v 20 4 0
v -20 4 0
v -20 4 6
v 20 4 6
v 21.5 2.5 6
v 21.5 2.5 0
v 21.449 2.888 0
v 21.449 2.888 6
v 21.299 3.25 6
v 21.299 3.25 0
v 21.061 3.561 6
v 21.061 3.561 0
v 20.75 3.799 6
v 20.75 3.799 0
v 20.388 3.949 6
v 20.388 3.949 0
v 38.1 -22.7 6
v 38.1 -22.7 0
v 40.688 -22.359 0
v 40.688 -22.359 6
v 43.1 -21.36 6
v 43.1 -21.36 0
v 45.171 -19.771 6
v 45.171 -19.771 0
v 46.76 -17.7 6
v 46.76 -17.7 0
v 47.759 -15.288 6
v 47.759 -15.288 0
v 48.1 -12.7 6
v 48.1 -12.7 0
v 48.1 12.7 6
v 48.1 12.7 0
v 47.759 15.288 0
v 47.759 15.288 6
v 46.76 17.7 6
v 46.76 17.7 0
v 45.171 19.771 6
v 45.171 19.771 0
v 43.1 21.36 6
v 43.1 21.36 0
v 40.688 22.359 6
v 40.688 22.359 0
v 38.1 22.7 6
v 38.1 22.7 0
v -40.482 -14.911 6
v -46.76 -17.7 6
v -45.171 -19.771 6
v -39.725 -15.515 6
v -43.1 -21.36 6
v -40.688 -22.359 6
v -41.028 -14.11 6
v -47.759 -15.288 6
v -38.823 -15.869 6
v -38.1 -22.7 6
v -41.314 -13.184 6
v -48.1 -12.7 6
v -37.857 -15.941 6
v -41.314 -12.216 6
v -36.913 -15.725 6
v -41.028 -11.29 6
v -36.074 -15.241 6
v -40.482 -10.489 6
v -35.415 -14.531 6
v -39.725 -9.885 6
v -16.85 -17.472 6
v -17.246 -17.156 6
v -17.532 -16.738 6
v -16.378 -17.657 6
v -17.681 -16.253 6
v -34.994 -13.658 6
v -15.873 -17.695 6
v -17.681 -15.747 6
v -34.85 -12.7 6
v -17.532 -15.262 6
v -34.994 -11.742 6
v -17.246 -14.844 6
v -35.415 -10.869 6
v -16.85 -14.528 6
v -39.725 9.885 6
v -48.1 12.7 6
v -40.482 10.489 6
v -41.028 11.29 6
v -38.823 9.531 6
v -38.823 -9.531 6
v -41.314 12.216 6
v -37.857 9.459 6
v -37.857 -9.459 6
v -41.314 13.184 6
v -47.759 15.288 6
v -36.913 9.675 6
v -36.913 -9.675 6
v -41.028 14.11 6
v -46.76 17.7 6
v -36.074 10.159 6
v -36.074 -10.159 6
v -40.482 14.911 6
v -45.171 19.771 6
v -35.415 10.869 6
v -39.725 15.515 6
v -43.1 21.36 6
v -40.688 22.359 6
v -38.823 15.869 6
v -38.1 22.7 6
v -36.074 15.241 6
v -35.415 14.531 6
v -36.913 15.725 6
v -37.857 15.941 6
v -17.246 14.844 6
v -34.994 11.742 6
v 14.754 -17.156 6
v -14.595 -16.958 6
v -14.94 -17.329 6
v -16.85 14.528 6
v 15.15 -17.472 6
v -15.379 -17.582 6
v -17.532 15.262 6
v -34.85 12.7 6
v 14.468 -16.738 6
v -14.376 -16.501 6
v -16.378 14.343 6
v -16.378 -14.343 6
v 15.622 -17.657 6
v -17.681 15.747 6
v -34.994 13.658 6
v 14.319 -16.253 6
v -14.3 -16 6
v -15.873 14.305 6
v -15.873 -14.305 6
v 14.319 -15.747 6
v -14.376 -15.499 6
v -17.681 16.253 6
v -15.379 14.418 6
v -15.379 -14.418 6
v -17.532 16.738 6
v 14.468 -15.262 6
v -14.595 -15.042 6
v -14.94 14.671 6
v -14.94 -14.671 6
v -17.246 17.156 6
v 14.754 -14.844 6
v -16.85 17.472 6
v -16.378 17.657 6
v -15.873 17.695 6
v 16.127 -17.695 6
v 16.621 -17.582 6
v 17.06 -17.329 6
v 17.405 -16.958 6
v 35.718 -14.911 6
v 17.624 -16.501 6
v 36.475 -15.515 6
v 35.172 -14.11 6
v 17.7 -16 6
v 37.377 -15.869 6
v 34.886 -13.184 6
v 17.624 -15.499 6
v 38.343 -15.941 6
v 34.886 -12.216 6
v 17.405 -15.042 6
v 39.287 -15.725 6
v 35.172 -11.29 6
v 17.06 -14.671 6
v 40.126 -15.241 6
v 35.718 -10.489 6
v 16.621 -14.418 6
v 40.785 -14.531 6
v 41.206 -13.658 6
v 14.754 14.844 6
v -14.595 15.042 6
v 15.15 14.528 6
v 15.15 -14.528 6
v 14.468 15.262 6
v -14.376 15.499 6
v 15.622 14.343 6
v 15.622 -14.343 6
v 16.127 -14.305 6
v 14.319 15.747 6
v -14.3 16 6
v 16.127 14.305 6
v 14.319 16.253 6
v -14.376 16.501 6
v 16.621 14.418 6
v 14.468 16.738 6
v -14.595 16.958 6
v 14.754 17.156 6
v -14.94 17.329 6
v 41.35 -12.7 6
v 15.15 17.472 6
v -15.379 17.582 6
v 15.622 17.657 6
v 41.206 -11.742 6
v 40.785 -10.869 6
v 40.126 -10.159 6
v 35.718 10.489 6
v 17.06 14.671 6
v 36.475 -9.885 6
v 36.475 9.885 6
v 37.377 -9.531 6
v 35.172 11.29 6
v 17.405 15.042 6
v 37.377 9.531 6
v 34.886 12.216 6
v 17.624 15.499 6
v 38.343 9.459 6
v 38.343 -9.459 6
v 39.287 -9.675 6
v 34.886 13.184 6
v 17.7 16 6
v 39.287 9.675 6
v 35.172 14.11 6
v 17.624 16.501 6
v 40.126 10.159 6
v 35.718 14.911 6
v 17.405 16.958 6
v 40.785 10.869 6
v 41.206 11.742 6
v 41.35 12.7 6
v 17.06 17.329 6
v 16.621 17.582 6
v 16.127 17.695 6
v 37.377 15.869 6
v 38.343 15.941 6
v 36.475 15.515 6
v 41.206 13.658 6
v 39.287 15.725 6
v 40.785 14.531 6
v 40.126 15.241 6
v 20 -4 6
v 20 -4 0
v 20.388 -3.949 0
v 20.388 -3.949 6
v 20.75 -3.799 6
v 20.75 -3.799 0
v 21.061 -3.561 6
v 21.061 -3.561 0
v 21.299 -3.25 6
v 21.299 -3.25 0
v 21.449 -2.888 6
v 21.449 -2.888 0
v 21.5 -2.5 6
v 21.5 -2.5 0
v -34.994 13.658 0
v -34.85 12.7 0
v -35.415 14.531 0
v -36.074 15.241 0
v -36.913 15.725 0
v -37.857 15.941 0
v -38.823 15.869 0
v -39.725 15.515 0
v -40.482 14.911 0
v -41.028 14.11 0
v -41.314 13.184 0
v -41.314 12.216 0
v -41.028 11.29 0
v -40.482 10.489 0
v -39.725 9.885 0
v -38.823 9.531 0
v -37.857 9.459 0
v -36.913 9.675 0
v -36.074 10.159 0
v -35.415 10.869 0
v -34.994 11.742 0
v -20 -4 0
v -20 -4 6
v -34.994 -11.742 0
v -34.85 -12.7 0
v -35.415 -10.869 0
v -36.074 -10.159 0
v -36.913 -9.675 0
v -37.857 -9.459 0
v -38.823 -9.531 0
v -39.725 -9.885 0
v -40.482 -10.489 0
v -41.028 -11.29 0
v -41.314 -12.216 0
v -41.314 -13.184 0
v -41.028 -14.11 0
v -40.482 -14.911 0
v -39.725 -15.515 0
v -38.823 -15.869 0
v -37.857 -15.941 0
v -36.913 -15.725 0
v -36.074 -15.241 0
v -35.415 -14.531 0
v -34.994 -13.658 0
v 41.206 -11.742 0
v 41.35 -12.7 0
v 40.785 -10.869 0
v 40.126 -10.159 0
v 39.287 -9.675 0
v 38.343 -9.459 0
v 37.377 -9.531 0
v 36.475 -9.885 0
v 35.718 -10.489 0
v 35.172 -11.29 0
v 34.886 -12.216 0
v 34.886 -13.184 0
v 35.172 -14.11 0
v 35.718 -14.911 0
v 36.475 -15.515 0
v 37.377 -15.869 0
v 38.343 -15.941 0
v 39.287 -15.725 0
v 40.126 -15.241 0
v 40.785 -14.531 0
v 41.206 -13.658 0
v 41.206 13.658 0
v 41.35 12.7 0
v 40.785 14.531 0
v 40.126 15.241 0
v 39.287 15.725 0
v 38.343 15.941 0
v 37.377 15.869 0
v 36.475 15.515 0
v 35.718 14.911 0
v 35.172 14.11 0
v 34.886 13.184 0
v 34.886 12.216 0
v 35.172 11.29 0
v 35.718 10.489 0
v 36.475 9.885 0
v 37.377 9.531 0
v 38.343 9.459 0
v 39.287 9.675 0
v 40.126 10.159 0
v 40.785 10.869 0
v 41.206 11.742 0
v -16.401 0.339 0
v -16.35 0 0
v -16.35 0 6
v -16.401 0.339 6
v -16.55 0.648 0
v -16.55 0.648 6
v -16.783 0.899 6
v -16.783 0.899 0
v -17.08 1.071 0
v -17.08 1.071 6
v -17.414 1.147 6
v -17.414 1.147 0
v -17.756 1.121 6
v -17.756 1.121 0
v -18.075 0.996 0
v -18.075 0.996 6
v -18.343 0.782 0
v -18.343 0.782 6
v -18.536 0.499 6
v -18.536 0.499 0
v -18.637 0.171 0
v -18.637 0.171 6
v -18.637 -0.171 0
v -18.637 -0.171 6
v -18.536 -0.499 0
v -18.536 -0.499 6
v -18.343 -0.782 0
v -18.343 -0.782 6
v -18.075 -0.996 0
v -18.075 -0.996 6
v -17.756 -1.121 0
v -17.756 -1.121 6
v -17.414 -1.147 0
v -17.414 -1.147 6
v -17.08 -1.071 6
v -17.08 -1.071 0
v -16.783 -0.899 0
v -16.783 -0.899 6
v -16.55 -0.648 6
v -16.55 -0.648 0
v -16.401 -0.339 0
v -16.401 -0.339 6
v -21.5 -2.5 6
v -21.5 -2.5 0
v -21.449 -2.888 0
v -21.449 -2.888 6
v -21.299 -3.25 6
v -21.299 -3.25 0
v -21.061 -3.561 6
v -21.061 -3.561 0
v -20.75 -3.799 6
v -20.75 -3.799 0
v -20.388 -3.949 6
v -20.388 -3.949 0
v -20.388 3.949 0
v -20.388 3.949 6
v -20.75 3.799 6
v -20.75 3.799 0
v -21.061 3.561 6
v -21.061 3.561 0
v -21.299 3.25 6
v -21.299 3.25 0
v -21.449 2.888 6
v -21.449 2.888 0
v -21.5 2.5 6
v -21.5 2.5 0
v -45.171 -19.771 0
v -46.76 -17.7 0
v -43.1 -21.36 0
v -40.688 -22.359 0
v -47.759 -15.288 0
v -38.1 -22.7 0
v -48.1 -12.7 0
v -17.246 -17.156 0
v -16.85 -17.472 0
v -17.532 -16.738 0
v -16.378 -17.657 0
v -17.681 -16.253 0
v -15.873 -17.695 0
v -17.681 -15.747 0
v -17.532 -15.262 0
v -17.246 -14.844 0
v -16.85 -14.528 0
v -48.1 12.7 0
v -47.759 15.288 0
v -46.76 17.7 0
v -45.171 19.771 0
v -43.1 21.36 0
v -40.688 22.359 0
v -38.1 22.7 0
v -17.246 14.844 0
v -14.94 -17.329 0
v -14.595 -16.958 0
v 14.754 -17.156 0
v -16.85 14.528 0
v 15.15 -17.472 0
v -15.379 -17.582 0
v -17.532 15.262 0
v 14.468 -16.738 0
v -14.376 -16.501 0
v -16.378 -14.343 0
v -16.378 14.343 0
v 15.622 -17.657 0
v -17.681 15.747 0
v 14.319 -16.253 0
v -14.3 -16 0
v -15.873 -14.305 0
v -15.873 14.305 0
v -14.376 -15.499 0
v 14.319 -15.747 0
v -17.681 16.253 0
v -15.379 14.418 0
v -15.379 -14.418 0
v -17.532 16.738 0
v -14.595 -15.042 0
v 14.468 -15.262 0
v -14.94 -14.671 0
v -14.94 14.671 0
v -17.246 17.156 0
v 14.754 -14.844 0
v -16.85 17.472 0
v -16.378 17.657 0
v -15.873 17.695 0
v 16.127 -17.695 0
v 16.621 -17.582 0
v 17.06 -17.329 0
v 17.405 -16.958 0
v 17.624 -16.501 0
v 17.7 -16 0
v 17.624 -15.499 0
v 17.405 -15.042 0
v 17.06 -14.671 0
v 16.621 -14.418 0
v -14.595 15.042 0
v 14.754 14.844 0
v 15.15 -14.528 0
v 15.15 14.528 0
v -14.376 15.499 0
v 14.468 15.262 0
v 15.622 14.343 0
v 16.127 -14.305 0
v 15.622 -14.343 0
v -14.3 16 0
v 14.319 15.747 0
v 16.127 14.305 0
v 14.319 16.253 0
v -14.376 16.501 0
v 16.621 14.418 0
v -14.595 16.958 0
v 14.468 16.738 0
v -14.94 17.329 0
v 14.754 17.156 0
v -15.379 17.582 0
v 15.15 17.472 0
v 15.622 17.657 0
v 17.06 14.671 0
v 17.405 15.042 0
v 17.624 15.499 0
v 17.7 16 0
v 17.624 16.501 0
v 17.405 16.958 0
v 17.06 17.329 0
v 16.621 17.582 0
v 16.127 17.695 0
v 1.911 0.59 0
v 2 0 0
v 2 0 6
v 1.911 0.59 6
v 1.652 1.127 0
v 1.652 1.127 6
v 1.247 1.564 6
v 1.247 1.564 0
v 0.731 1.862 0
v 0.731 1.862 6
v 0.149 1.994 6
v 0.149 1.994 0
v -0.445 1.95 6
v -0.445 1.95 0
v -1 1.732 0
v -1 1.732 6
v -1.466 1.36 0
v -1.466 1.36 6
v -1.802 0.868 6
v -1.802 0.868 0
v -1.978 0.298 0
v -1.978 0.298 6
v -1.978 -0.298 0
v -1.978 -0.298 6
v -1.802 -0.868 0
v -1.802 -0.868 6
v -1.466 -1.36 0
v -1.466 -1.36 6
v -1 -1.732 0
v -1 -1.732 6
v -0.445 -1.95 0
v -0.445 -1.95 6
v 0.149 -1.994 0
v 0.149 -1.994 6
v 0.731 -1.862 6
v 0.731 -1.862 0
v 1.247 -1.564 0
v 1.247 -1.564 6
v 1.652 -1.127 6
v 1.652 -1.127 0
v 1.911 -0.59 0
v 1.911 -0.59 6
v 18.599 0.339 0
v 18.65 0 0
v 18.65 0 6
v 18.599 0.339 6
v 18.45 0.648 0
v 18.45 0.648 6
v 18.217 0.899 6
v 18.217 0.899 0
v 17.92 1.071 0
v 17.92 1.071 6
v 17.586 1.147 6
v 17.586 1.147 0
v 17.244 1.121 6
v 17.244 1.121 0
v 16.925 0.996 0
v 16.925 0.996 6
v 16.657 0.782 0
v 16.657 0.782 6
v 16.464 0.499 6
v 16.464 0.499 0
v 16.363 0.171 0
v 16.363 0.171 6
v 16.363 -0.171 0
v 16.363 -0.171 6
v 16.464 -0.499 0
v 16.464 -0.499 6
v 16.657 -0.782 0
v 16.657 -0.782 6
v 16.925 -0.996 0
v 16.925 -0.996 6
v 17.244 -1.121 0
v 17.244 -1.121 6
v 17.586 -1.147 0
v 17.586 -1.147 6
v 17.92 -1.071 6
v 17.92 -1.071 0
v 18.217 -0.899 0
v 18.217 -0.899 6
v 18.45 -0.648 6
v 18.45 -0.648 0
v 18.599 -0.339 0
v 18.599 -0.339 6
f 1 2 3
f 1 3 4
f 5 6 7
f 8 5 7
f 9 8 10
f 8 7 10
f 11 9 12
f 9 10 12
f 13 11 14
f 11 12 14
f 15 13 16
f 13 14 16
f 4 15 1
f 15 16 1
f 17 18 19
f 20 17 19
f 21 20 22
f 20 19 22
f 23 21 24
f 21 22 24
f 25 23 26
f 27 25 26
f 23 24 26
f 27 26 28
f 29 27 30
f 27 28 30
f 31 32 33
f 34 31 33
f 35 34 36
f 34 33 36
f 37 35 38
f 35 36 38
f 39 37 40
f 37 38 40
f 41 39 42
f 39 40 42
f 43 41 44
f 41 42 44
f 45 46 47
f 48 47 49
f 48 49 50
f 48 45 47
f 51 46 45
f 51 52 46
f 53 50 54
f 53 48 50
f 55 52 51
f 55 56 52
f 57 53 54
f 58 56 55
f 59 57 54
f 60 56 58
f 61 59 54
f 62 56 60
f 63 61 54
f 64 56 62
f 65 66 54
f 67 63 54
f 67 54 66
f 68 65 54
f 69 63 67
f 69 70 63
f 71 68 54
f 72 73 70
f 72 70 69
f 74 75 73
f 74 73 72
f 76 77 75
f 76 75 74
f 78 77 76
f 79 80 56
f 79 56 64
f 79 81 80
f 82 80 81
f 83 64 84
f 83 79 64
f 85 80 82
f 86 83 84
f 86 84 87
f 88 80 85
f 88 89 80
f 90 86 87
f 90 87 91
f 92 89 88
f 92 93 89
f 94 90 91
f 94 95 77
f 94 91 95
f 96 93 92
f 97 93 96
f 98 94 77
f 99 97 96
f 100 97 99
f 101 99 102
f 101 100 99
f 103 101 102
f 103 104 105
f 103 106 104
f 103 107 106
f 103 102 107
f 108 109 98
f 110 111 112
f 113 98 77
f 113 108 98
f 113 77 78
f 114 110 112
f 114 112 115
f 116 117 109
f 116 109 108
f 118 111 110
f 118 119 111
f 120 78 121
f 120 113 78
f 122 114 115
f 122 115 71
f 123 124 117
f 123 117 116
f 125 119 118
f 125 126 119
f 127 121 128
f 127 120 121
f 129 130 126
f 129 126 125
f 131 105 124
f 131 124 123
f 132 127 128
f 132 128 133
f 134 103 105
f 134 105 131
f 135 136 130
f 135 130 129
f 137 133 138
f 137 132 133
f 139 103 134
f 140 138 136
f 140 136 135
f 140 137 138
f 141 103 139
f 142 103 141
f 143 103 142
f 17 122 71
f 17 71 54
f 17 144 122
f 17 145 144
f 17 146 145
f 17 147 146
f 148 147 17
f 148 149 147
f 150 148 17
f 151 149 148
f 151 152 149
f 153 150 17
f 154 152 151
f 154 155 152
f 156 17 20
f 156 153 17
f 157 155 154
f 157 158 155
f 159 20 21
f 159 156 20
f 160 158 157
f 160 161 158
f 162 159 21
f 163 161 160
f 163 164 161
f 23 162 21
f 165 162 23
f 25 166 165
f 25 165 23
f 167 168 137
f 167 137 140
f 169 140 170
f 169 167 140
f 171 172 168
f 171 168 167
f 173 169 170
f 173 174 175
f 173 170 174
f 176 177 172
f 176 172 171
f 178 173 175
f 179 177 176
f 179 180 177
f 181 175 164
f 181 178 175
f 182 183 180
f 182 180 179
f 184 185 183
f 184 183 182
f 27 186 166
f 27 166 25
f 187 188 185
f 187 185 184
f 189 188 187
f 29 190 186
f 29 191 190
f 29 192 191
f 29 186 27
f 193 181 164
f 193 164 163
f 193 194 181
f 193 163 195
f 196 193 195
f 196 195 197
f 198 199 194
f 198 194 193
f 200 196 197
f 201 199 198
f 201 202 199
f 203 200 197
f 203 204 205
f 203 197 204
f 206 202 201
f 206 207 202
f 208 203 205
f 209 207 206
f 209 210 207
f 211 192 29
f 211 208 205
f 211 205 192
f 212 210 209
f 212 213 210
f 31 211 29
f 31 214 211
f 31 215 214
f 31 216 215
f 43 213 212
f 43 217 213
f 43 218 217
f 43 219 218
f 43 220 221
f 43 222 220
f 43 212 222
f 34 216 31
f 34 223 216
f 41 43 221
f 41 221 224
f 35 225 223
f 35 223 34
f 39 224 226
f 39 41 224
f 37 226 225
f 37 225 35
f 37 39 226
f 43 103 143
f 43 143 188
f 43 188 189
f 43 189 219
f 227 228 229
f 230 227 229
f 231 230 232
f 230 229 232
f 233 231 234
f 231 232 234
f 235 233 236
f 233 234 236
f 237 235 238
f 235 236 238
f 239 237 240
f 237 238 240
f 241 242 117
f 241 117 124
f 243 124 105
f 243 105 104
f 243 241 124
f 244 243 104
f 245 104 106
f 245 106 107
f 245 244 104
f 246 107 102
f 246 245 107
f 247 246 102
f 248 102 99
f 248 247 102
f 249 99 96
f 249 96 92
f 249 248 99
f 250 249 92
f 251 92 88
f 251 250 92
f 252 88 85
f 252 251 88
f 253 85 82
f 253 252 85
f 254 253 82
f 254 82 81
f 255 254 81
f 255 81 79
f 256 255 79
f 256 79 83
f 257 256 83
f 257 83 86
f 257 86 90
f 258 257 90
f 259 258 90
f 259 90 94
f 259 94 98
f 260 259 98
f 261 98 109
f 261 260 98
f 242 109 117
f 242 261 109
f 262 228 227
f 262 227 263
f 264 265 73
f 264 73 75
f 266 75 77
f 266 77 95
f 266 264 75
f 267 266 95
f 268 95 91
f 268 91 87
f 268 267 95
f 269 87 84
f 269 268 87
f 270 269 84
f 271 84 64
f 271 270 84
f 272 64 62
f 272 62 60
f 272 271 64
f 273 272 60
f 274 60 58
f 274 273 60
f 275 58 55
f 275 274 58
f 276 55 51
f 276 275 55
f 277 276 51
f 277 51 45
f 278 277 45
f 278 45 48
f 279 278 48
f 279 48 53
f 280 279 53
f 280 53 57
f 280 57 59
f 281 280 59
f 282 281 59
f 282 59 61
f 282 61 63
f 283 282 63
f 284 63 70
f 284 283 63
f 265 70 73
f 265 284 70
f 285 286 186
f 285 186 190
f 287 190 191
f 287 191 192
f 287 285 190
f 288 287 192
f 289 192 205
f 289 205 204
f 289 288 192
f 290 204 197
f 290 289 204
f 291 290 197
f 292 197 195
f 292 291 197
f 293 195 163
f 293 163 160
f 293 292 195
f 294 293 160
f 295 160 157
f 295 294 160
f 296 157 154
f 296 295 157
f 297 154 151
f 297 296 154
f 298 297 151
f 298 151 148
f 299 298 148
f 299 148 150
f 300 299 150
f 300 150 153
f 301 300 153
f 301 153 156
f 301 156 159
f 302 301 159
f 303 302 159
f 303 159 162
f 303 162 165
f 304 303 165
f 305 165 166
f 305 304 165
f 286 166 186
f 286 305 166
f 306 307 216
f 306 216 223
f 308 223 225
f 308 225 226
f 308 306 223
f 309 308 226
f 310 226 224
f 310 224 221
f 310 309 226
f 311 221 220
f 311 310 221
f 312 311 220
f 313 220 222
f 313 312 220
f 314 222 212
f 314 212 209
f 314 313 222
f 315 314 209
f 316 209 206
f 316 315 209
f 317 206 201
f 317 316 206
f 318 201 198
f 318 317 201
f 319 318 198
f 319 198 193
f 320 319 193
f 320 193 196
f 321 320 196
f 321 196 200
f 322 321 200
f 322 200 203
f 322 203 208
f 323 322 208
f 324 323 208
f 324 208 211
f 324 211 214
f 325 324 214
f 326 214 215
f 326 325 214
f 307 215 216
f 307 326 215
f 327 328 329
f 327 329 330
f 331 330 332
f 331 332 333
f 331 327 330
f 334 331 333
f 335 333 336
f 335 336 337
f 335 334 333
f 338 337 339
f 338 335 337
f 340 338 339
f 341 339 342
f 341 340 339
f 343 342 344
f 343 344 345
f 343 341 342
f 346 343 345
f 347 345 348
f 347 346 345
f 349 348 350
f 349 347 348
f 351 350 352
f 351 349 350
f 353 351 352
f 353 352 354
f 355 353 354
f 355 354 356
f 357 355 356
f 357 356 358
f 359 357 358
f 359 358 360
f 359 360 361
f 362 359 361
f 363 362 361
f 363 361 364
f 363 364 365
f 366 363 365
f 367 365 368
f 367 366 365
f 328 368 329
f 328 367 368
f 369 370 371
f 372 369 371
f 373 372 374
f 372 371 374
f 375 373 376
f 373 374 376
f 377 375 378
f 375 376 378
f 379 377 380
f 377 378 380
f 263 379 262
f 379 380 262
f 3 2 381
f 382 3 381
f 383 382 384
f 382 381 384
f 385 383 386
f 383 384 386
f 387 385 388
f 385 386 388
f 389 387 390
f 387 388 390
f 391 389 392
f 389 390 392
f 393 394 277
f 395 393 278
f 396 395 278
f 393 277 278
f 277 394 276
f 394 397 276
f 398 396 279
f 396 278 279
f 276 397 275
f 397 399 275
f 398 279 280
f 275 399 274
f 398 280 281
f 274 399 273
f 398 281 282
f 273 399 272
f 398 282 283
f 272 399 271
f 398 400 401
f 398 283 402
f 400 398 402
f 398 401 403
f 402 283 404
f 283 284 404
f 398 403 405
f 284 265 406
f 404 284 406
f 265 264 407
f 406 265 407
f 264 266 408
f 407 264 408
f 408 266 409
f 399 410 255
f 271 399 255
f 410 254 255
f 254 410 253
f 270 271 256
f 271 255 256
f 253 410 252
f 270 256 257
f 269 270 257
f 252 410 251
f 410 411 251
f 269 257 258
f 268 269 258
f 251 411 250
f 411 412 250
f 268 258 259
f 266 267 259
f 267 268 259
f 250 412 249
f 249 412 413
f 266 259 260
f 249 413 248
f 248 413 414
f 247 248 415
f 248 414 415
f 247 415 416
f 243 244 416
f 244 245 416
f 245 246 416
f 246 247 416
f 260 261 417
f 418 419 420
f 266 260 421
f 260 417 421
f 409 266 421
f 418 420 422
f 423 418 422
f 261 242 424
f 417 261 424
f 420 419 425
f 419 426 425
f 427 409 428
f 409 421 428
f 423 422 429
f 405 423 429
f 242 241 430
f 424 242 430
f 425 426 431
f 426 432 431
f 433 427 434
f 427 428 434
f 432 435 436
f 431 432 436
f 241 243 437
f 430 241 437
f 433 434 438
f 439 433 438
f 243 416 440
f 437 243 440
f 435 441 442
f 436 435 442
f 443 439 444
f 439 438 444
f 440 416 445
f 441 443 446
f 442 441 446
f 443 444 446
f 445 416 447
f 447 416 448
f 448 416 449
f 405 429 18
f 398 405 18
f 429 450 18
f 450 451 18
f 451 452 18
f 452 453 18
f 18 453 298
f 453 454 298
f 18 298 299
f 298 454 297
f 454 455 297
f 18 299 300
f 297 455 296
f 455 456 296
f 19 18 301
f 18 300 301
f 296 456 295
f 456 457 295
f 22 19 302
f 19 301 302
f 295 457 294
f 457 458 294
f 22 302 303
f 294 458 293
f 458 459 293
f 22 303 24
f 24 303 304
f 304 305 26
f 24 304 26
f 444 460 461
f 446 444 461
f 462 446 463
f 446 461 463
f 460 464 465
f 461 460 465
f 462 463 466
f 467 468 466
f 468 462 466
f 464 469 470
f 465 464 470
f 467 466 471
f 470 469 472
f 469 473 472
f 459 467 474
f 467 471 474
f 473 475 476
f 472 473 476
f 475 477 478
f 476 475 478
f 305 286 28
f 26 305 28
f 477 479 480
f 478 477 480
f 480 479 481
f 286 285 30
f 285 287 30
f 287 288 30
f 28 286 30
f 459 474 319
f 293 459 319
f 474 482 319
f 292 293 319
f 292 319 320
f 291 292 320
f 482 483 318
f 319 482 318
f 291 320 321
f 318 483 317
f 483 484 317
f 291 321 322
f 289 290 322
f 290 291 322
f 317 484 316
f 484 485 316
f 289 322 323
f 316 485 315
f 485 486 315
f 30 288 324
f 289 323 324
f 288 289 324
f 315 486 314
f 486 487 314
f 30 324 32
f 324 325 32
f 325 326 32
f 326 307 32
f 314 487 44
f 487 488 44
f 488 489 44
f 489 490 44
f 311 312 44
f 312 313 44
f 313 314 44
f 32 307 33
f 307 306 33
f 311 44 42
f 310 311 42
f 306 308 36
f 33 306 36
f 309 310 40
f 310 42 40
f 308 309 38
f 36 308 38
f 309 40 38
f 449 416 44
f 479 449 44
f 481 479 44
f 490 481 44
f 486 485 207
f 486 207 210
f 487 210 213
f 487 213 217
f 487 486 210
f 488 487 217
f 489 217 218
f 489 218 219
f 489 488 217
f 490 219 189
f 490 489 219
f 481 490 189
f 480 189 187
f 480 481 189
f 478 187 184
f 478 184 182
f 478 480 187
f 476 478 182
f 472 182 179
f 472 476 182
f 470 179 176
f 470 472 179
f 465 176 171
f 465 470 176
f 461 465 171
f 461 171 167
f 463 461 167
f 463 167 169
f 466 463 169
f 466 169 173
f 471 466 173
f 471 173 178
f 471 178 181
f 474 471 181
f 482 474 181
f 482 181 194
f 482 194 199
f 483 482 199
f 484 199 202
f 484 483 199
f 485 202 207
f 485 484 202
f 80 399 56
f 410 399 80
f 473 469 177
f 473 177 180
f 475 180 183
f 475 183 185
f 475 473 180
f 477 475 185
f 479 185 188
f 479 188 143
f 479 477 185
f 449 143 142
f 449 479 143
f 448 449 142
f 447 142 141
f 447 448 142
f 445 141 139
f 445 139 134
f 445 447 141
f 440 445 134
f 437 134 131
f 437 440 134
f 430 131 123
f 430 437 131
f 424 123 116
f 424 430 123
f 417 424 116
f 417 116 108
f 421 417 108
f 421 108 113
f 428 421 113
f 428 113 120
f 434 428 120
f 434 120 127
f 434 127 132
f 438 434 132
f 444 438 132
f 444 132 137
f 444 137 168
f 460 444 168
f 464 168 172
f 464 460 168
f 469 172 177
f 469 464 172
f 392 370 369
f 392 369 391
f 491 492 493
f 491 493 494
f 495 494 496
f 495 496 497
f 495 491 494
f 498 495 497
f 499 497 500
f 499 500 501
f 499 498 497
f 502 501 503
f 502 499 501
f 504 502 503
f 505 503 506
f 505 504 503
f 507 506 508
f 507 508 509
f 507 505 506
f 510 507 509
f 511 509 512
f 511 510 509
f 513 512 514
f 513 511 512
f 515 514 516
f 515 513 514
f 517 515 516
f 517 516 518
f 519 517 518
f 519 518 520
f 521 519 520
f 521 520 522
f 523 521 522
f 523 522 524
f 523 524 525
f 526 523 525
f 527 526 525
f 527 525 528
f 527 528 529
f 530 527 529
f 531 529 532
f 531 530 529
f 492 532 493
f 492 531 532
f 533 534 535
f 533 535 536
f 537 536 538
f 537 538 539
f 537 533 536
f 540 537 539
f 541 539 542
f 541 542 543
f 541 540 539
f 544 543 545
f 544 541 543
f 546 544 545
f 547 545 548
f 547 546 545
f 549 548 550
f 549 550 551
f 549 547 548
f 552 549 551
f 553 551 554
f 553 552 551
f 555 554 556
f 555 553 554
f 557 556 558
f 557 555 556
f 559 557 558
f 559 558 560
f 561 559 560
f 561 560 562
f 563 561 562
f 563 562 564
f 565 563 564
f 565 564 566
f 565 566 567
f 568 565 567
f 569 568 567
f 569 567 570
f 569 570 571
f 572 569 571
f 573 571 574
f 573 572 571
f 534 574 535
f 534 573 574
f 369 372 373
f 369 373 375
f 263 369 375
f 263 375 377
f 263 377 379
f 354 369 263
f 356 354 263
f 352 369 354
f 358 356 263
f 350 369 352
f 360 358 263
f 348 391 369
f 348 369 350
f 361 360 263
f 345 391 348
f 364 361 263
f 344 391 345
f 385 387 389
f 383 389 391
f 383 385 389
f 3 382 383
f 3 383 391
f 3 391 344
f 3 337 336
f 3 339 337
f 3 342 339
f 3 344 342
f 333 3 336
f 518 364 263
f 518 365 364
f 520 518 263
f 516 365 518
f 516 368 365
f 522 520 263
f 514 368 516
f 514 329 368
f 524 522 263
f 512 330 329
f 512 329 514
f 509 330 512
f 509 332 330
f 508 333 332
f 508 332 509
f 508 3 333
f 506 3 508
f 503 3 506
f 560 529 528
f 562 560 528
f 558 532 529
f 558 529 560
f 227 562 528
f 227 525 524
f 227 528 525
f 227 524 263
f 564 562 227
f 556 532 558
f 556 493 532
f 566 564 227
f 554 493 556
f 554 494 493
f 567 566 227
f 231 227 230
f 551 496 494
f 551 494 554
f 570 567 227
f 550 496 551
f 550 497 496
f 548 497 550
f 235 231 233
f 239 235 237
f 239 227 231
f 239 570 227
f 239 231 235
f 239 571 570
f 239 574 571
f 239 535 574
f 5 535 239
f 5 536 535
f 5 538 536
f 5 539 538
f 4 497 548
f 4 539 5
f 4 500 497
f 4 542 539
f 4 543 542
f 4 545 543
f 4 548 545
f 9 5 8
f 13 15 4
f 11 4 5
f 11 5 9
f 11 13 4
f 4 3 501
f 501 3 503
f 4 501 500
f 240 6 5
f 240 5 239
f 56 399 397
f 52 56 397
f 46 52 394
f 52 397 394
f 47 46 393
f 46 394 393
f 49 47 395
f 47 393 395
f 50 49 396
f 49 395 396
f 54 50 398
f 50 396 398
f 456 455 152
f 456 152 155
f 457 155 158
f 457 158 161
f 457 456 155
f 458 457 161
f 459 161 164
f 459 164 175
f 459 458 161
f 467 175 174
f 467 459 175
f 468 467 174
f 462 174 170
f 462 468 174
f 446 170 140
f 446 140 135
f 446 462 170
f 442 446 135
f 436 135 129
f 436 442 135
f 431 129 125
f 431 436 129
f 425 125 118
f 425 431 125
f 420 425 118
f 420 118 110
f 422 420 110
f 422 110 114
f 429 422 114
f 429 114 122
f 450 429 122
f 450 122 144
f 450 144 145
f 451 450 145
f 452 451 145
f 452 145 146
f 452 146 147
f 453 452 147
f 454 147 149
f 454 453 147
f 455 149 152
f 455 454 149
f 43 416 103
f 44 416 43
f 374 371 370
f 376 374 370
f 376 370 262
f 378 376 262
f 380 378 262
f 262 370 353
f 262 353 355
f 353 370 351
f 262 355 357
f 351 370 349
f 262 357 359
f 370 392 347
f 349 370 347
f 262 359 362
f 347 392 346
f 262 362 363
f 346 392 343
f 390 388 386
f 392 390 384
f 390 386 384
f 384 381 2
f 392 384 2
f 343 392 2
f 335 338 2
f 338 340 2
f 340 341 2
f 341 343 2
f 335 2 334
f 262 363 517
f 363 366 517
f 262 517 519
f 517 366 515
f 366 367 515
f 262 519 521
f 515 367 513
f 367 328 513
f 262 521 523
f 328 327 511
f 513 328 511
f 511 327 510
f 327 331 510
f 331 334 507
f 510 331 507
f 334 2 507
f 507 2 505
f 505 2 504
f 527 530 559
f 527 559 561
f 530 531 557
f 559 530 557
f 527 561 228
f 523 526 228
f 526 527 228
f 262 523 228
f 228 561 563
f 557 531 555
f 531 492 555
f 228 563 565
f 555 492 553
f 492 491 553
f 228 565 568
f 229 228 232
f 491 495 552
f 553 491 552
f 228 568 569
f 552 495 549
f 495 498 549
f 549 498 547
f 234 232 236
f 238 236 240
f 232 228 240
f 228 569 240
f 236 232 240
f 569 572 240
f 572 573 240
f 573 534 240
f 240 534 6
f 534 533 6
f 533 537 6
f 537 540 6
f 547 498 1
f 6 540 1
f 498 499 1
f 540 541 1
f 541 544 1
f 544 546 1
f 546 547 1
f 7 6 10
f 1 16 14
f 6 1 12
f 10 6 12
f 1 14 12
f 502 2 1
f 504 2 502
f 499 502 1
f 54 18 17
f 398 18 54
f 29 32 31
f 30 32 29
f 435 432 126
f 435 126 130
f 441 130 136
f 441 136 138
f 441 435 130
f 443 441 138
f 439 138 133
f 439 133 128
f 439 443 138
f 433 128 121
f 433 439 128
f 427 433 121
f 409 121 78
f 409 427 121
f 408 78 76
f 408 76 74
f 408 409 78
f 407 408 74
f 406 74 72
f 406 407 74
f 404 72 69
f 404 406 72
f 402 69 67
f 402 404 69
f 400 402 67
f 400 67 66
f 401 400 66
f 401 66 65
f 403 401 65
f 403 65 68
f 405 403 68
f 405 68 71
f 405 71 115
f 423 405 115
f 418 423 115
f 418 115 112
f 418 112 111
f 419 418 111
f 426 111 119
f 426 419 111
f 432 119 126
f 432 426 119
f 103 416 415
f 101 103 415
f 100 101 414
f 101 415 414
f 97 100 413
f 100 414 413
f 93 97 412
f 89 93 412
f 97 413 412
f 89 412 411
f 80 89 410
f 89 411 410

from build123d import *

# Parameters (mm, degrees)
SKETCH_R      = 3.25
SKETCH_R_2    = 1.7
PAD_DEPTH     = 6
SKETCH001_R   = 1.15
SKETCH001_R_2 = 2
PAD001_DEPTH  = 6


with BuildPart() as body:
    # Sketch → Pad (new body)
    with BuildSketch(Plane.XY):
        with BuildLine():
            ThreePointArc((-38.1, 22.7), (-45.171068, 19.771068), (-48.1, 12.7))
            Line((-48.1, -12.7), (-48.1, 12.7))
            ThreePointArc((-48.1, -12.7), (-45.171068, -19.771068), (-38.1, -22.7))
            Line((38.1, -22.7), (-38.1, -22.7))
            ThreePointArc((38.1, -22.7), (45.171068, -19.771068), (48.1, -12.7))
            Line((48.1, 12.7), (48.1, -12.7))
            ThreePointArc((48.1, 12.7), (45.171068, 19.771068), (38.1, 22.7))
            Line((-38.1, 22.7), (38.1, 22.7))
        make_face()
        with Locations((-38.1, 12.7)):
            Circle(SKETCH_R, mode=Mode.SUBTRACT)
        with Locations((38.1, 12.7)):
            Circle(SKETCH_R, mode=Mode.SUBTRACT)
        with Locations((38.1, -12.7)):
            Circle(SKETCH_R, mode=Mode.SUBTRACT)
        with Locations((-38.1, -12.7)):
            Circle(SKETCH_R, mode=Mode.SUBTRACT)
        with Locations((-16, 16)):
            Circle(SKETCH_R_2, mode=Mode.SUBTRACT)
        with Locations((16, 16)):
            Circle(SKETCH_R_2, mode=Mode.SUBTRACT)
        with Locations((16, -16)):
            Circle(SKETCH_R_2, mode=Mode.SUBTRACT)
        with Locations((-16, -16)):
            Circle(SKETCH_R_2, mode=Mode.SUBTRACT)
    extrude(amount=PAD_DEPTH)


with BuildPart() as body001:
    # Sketch001 → Pad001 (new body)
    with BuildSketch(Plane.XY):
        with BuildLine():
            ThreePointArc((-20, 4), (-21.06066, 3.56066), (-21.5, 2.5))
            Line((-21.5, -2.5), (-21.5, 2.5))
            ThreePointArc((-21.5, -2.5), (-21.06066, -3.56066), (-20, -4))
            Line((20, -4), (-20, -4))
            ThreePointArc((20, -4), (21.06066, -3.56066), (21.5, -2.5))
            Line((21.5, 2.5), (21.5, -2.5))
            ThreePointArc((21.5, 2.5), (21.06066, 3.56066), (20, 4))
            Line((-20, 4), (20, 4))
        make_face()
        with Locations((-17.5, 0)):
            Circle(SKETCH001_R, mode=Mode.SUBTRACT)
        with Locations((17.5, 0)):
            Circle(SKETCH001_R, mode=Mode.SUBTRACT)
        Circle(SKETCH001_R_2, mode=Mode.SUBTRACT)
    extrude(amount=PAD001_DEPTH)


solid = Compound([body.part, body001.part])
